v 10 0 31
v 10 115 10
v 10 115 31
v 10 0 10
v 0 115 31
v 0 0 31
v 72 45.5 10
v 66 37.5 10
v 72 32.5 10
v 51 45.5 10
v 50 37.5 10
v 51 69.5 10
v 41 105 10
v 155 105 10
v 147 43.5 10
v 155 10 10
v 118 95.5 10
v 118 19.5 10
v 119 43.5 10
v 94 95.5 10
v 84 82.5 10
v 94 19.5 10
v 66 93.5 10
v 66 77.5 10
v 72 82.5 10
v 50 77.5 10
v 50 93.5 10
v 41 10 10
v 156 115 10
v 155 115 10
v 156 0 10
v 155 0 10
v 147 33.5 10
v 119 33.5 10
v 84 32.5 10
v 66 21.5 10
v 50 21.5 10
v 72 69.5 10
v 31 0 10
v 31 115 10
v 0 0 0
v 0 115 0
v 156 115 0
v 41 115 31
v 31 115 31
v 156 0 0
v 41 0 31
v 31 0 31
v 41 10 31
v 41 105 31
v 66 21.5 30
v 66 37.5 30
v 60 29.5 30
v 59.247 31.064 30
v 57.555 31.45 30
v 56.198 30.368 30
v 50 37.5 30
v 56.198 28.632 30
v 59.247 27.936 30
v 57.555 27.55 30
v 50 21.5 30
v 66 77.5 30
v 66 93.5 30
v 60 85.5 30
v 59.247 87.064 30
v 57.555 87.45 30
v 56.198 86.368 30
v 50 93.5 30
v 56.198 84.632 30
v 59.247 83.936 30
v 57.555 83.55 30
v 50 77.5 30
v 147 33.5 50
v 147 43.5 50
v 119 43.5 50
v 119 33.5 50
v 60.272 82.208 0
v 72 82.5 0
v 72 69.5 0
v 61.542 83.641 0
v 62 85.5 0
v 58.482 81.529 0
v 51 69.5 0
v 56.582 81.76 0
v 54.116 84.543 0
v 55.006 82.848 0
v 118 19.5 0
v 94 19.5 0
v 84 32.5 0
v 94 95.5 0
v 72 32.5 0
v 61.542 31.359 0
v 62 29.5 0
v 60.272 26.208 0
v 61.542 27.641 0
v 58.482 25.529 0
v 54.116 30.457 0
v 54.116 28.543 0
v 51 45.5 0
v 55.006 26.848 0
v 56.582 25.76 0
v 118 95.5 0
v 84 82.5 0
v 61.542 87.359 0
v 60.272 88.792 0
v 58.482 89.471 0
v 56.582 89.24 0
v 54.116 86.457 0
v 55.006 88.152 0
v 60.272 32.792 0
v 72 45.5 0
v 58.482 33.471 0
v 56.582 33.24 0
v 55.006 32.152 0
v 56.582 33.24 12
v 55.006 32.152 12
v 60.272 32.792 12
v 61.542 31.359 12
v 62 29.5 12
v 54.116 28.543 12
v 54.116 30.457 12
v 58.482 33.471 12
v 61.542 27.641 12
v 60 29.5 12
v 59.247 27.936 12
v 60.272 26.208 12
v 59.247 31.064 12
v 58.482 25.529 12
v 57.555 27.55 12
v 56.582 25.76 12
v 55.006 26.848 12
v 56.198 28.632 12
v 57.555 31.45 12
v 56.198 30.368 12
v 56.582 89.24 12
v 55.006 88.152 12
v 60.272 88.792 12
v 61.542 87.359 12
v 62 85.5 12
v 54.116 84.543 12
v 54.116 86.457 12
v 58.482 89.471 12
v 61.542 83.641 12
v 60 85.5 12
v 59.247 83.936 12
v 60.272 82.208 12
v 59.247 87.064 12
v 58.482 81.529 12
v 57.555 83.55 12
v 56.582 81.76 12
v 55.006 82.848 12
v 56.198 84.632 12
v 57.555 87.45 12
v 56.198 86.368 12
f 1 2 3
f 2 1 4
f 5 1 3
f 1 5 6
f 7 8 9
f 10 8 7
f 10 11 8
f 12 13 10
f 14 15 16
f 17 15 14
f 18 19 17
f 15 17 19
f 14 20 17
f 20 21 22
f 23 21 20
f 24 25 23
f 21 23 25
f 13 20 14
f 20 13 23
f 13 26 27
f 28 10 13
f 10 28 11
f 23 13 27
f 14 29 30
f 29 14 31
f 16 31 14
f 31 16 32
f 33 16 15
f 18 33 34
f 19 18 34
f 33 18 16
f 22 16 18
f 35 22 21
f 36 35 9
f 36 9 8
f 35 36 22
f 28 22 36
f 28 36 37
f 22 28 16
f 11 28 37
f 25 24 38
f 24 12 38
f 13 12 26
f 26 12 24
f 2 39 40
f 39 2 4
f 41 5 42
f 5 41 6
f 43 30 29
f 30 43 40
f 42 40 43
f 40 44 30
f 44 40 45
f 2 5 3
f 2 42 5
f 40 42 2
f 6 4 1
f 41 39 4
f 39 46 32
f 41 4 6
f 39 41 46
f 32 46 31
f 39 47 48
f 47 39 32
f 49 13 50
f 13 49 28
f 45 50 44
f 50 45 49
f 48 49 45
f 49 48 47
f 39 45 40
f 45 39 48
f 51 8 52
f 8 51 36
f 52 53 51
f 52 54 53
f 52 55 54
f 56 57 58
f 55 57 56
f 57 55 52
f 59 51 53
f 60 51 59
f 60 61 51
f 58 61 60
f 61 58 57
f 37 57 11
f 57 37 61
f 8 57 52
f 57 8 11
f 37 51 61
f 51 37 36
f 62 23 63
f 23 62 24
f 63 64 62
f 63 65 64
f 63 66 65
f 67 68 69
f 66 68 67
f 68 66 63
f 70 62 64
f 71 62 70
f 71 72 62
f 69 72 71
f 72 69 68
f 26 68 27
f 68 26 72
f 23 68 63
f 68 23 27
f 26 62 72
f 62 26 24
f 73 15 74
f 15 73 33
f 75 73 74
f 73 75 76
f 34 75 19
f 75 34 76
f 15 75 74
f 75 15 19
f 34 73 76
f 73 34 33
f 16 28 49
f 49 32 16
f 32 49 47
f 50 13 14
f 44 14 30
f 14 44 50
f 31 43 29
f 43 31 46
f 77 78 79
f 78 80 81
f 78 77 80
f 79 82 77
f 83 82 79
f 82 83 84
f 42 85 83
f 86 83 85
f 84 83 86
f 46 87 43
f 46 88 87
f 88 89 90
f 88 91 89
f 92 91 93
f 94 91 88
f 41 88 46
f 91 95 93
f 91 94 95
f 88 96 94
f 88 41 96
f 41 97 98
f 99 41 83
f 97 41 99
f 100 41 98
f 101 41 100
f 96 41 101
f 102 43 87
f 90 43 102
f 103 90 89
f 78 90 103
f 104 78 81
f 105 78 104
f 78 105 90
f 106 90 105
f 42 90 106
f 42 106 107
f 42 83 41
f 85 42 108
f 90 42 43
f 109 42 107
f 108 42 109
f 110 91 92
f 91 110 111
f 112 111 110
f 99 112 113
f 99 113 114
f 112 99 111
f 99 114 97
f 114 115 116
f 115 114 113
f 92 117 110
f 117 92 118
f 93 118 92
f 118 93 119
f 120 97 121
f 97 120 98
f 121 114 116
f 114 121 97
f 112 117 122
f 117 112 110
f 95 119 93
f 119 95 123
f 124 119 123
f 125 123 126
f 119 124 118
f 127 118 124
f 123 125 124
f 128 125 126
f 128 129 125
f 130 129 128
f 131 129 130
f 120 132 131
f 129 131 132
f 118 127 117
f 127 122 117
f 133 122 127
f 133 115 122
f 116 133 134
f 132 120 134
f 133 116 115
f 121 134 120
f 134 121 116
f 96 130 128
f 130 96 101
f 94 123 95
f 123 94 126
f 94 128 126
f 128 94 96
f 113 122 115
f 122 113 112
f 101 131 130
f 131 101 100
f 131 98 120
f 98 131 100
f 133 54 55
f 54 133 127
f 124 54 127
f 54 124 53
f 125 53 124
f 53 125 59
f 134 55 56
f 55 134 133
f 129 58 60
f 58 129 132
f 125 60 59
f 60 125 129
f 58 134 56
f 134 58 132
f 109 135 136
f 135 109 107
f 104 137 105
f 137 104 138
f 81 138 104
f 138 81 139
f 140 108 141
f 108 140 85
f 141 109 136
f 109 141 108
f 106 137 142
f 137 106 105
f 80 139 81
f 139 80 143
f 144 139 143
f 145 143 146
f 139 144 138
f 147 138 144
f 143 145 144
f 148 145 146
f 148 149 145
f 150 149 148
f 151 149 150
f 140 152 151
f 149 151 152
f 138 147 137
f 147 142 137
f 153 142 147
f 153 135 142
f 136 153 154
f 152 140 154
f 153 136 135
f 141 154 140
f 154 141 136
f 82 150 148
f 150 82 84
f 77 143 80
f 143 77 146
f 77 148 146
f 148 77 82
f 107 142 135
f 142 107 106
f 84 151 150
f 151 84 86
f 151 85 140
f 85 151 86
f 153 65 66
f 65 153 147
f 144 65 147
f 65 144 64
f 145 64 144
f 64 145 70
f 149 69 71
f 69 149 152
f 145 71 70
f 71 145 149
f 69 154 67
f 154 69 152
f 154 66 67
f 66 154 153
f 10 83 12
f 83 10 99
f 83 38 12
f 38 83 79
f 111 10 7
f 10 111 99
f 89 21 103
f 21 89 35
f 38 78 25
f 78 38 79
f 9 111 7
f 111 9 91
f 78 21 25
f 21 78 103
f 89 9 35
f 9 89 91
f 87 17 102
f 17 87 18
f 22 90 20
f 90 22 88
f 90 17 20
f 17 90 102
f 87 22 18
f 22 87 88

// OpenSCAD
largeur_profile = 21;

support_moteur_largeur = 28;
support_moteur_epaisseur = 10;
support_moteur_hauteur = 40;

roue_jeu = 2;
roue_diametre = 72 + 2 * roue_jeu;
roue_largeur = 20 + 2 * roue_jeu;

decalage_centre_roue_support_moteur = 14;

codeuse_diametre = 24;
codeuse_profondeur = 21;
codeuse_roue_diametre = 50;
codeuse_roue_epaisseur = 12;
codeuse_distance_fixation_codeuse = 20;
codeuse_decalage_ressorts = 3;
codeuse_roulement_diametre = 8;
codeuse_roulement_hauteur = 12;
codeuse_distance_support = 28;
codeuse_axe_diametre = 4;
codeuse_support_cote = codeuse_roulement_diametre + 8;
codeuse_support_hauteur = 20;

plaque_epaisseur = 10;
plaque_largeur = 115;
plaque_longueur = roue_largeur + support_moteur_largeur + 3 * plaque_epaisseur + largeur_profile + codeuse_profondeur + codeuse_distance_fixation_codeuse + codeuse_roue_epaisseur; 

difference(){
	union(){
		//plaque
		cube([plaque_longueur, plaque_largeur, plaque_epaisseur]);

		//sur la plaque
		translate([0, 0, plaque_epaisseur]){
			//plaques de profile
			cube([plaque_epaisseur, plaque_largeur, largeur_profile]);
			translate([largeur_profile + plaque_epaisseur, 0, 0]){
				cube([plaque_epaisseur, plaque_largeur, largeur_profile]);
			}

			//support codeuse
			translate([
				largeur_profile + 3 * plaque_epaisseur + codeuse_profondeur + codeuse_roue_epaisseur / 2 - codeuse_distance_fixation_codeuse - codeuse_support_cote / 2, 
				plaque_largeur / 2 - codeuse_distance_support - codeuse_support_cote / 2, 
				0
			]){
				cube([codeuse_support_cote, codeuse_support_cote, codeuse_support_hauteur]);
			}
			translate([
				largeur_profile + 3 * plaque_epaisseur + codeuse_profondeur + codeuse_roue_epaisseur / 2 - codeuse_distance_fixation_codeuse - codeuse_support_cote / 2, 
				plaque_largeur / 2 + codeuse_distance_support - codeuse_support_cote / 2, 
				0
			]){
				cube([codeuse_support_cote, codeuse_support_cote, codeuse_support_hauteur]);
			}

			translate([
				largeur_profile + 4 * plaque_epaisseur + codeuse_profondeur + codeuse_roue_epaisseur + roue_largeur + 1, 
				plaque_largeur / 2 - support_moteur_epaisseur -  decalage_centre_roue_support_moteur, 
				0
			]){
				cube([support_moteur_largeur, support_moteur_epaisseur, support_moteur_hauteur]);
			}

			//support cote
			polyhedron(
				points = [
			       [largeur_profile + 2 * plaque_epaisseur, 0, 0],
			       [largeur_profile + 2 * plaque_epaisseur, plaque_epaisseur, 0],
			       [largeur_profile + 2 * plaque_epaisseur, 0, largeur_profile],
			       [largeur_profile + 2 * plaque_epaisseur, plaque_epaisseur, largeur_profile],
			       [plaque_longueur - largeur_profile + 2 * plaque_epaisseur, 0, 0],
			       [plaque_longueur - largeur_profile + 2 * plaque_epaisseur, plaque_epaisseur, 0]
			    ], faces = [
					  [0,1,3,2], [4,5,1,0], [2,3,5,4], [0,2,4], [5,3,1]
				]
			);

			polyhedron(
				points = [
			       [largeur_profile + 2 * plaque_epaisseur, plaque_largeur - plaque_epaisseur + 0, 0],
			       [largeur_profile + 2 * plaque_epaisseur, plaque_largeur - plaque_epaisseur + plaque_epaisseur, 0],
			       [largeur_profile + 2 * plaque_epaisseur, plaque_largeur - plaque_epaisseur + 0, largeur_profile],
			       [largeur_profile + 2 * plaque_epaisseur, plaque_largeur - plaque_epaisseur + plaque_epaisseur, largeur_profile],
			       [plaque_longueur - largeur_profile + 2 * plaque_epaisseur, plaque_largeur - plaque_epaisseur + 0, 0],
			       [plaque_longueur - largeur_profile + 2 * plaque_epaisseur, plaque_largeur - plaque_epaisseur + plaque_epaisseur, 0]
			    ], faces = [
					  [0,1,3,2], [4,5,1,0], [2,3,5,4], [0,2,4], [5,3,1]
				]
			);
		}
	}

	union(){
		//retrais pour extrusion
		translate([0,0,-1]){
			//codeuse
			translate([largeur_profile + 3 * plaque_epaisseur, plaque_largeur / 2 - codeuse_diametre / 2 , 0]){
				cube([codeuse_profondeur + 1, codeuse_diametre, plaque_epaisseur + 2]);
			}
			translate([largeur_profile + 3 * plaque_epaisseur + codeuse_profondeur, plaque_largeur / 2 - codeuse_roue_diametre / 2 , 0]){
				cube([codeuse_roue_epaisseur, codeuse_roue_diametre, plaque_epaisseur + 2]);
			}
			//roulement codeuse
			translate([
				largeur_profile + 3 * plaque_epaisseur + codeuse_profondeur + codeuse_support_cote / 2 + codeuse_roue_epaisseur / 2 - codeuse_distance_fixation_codeuse - codeuse_support_cote / 2, 
				plaque_largeur / 2 - codeuse_distance_support, 
				0
			]){
				cylinder(d = codeuse_roulement_diametre, h = codeuse_roulement_hauteur + 1);
				cylinder(d = codeuse_axe_diametre, h = codeuse_support_hauteur + plaque_epaisseur + 2);
			}
			translate([
				largeur_profile + 3 * plaque_epaisseur + codeuse_profondeur + codeuse_support_cote / 2 + codeuse_roue_epaisseur / 2 - codeuse_distance_fixation_codeuse - codeuse_support_cote / 2, 
				plaque_largeur / 2 + codeuse_distance_support, 
				0
			]){
				cylinder(d = codeuse_roulement_diametre, h = codeuse_roulement_hauteur + 1);
				cylinder(d = codeuse_axe_diametre, h = codeuse_support_hauteur + plaque_epaisseur + 2);
			}

			//roue
			translate([largeur_profile + 4 * plaque_epaisseur + codeuse_profondeur + codeuse_roue_epaisseur, plaque_largeur / 2 - roue_diametre / 2 , 0]){
				cube([roue_largeur, roue_diametre, plaque_epaisseur + 2]);
			}
		}
	}
}
